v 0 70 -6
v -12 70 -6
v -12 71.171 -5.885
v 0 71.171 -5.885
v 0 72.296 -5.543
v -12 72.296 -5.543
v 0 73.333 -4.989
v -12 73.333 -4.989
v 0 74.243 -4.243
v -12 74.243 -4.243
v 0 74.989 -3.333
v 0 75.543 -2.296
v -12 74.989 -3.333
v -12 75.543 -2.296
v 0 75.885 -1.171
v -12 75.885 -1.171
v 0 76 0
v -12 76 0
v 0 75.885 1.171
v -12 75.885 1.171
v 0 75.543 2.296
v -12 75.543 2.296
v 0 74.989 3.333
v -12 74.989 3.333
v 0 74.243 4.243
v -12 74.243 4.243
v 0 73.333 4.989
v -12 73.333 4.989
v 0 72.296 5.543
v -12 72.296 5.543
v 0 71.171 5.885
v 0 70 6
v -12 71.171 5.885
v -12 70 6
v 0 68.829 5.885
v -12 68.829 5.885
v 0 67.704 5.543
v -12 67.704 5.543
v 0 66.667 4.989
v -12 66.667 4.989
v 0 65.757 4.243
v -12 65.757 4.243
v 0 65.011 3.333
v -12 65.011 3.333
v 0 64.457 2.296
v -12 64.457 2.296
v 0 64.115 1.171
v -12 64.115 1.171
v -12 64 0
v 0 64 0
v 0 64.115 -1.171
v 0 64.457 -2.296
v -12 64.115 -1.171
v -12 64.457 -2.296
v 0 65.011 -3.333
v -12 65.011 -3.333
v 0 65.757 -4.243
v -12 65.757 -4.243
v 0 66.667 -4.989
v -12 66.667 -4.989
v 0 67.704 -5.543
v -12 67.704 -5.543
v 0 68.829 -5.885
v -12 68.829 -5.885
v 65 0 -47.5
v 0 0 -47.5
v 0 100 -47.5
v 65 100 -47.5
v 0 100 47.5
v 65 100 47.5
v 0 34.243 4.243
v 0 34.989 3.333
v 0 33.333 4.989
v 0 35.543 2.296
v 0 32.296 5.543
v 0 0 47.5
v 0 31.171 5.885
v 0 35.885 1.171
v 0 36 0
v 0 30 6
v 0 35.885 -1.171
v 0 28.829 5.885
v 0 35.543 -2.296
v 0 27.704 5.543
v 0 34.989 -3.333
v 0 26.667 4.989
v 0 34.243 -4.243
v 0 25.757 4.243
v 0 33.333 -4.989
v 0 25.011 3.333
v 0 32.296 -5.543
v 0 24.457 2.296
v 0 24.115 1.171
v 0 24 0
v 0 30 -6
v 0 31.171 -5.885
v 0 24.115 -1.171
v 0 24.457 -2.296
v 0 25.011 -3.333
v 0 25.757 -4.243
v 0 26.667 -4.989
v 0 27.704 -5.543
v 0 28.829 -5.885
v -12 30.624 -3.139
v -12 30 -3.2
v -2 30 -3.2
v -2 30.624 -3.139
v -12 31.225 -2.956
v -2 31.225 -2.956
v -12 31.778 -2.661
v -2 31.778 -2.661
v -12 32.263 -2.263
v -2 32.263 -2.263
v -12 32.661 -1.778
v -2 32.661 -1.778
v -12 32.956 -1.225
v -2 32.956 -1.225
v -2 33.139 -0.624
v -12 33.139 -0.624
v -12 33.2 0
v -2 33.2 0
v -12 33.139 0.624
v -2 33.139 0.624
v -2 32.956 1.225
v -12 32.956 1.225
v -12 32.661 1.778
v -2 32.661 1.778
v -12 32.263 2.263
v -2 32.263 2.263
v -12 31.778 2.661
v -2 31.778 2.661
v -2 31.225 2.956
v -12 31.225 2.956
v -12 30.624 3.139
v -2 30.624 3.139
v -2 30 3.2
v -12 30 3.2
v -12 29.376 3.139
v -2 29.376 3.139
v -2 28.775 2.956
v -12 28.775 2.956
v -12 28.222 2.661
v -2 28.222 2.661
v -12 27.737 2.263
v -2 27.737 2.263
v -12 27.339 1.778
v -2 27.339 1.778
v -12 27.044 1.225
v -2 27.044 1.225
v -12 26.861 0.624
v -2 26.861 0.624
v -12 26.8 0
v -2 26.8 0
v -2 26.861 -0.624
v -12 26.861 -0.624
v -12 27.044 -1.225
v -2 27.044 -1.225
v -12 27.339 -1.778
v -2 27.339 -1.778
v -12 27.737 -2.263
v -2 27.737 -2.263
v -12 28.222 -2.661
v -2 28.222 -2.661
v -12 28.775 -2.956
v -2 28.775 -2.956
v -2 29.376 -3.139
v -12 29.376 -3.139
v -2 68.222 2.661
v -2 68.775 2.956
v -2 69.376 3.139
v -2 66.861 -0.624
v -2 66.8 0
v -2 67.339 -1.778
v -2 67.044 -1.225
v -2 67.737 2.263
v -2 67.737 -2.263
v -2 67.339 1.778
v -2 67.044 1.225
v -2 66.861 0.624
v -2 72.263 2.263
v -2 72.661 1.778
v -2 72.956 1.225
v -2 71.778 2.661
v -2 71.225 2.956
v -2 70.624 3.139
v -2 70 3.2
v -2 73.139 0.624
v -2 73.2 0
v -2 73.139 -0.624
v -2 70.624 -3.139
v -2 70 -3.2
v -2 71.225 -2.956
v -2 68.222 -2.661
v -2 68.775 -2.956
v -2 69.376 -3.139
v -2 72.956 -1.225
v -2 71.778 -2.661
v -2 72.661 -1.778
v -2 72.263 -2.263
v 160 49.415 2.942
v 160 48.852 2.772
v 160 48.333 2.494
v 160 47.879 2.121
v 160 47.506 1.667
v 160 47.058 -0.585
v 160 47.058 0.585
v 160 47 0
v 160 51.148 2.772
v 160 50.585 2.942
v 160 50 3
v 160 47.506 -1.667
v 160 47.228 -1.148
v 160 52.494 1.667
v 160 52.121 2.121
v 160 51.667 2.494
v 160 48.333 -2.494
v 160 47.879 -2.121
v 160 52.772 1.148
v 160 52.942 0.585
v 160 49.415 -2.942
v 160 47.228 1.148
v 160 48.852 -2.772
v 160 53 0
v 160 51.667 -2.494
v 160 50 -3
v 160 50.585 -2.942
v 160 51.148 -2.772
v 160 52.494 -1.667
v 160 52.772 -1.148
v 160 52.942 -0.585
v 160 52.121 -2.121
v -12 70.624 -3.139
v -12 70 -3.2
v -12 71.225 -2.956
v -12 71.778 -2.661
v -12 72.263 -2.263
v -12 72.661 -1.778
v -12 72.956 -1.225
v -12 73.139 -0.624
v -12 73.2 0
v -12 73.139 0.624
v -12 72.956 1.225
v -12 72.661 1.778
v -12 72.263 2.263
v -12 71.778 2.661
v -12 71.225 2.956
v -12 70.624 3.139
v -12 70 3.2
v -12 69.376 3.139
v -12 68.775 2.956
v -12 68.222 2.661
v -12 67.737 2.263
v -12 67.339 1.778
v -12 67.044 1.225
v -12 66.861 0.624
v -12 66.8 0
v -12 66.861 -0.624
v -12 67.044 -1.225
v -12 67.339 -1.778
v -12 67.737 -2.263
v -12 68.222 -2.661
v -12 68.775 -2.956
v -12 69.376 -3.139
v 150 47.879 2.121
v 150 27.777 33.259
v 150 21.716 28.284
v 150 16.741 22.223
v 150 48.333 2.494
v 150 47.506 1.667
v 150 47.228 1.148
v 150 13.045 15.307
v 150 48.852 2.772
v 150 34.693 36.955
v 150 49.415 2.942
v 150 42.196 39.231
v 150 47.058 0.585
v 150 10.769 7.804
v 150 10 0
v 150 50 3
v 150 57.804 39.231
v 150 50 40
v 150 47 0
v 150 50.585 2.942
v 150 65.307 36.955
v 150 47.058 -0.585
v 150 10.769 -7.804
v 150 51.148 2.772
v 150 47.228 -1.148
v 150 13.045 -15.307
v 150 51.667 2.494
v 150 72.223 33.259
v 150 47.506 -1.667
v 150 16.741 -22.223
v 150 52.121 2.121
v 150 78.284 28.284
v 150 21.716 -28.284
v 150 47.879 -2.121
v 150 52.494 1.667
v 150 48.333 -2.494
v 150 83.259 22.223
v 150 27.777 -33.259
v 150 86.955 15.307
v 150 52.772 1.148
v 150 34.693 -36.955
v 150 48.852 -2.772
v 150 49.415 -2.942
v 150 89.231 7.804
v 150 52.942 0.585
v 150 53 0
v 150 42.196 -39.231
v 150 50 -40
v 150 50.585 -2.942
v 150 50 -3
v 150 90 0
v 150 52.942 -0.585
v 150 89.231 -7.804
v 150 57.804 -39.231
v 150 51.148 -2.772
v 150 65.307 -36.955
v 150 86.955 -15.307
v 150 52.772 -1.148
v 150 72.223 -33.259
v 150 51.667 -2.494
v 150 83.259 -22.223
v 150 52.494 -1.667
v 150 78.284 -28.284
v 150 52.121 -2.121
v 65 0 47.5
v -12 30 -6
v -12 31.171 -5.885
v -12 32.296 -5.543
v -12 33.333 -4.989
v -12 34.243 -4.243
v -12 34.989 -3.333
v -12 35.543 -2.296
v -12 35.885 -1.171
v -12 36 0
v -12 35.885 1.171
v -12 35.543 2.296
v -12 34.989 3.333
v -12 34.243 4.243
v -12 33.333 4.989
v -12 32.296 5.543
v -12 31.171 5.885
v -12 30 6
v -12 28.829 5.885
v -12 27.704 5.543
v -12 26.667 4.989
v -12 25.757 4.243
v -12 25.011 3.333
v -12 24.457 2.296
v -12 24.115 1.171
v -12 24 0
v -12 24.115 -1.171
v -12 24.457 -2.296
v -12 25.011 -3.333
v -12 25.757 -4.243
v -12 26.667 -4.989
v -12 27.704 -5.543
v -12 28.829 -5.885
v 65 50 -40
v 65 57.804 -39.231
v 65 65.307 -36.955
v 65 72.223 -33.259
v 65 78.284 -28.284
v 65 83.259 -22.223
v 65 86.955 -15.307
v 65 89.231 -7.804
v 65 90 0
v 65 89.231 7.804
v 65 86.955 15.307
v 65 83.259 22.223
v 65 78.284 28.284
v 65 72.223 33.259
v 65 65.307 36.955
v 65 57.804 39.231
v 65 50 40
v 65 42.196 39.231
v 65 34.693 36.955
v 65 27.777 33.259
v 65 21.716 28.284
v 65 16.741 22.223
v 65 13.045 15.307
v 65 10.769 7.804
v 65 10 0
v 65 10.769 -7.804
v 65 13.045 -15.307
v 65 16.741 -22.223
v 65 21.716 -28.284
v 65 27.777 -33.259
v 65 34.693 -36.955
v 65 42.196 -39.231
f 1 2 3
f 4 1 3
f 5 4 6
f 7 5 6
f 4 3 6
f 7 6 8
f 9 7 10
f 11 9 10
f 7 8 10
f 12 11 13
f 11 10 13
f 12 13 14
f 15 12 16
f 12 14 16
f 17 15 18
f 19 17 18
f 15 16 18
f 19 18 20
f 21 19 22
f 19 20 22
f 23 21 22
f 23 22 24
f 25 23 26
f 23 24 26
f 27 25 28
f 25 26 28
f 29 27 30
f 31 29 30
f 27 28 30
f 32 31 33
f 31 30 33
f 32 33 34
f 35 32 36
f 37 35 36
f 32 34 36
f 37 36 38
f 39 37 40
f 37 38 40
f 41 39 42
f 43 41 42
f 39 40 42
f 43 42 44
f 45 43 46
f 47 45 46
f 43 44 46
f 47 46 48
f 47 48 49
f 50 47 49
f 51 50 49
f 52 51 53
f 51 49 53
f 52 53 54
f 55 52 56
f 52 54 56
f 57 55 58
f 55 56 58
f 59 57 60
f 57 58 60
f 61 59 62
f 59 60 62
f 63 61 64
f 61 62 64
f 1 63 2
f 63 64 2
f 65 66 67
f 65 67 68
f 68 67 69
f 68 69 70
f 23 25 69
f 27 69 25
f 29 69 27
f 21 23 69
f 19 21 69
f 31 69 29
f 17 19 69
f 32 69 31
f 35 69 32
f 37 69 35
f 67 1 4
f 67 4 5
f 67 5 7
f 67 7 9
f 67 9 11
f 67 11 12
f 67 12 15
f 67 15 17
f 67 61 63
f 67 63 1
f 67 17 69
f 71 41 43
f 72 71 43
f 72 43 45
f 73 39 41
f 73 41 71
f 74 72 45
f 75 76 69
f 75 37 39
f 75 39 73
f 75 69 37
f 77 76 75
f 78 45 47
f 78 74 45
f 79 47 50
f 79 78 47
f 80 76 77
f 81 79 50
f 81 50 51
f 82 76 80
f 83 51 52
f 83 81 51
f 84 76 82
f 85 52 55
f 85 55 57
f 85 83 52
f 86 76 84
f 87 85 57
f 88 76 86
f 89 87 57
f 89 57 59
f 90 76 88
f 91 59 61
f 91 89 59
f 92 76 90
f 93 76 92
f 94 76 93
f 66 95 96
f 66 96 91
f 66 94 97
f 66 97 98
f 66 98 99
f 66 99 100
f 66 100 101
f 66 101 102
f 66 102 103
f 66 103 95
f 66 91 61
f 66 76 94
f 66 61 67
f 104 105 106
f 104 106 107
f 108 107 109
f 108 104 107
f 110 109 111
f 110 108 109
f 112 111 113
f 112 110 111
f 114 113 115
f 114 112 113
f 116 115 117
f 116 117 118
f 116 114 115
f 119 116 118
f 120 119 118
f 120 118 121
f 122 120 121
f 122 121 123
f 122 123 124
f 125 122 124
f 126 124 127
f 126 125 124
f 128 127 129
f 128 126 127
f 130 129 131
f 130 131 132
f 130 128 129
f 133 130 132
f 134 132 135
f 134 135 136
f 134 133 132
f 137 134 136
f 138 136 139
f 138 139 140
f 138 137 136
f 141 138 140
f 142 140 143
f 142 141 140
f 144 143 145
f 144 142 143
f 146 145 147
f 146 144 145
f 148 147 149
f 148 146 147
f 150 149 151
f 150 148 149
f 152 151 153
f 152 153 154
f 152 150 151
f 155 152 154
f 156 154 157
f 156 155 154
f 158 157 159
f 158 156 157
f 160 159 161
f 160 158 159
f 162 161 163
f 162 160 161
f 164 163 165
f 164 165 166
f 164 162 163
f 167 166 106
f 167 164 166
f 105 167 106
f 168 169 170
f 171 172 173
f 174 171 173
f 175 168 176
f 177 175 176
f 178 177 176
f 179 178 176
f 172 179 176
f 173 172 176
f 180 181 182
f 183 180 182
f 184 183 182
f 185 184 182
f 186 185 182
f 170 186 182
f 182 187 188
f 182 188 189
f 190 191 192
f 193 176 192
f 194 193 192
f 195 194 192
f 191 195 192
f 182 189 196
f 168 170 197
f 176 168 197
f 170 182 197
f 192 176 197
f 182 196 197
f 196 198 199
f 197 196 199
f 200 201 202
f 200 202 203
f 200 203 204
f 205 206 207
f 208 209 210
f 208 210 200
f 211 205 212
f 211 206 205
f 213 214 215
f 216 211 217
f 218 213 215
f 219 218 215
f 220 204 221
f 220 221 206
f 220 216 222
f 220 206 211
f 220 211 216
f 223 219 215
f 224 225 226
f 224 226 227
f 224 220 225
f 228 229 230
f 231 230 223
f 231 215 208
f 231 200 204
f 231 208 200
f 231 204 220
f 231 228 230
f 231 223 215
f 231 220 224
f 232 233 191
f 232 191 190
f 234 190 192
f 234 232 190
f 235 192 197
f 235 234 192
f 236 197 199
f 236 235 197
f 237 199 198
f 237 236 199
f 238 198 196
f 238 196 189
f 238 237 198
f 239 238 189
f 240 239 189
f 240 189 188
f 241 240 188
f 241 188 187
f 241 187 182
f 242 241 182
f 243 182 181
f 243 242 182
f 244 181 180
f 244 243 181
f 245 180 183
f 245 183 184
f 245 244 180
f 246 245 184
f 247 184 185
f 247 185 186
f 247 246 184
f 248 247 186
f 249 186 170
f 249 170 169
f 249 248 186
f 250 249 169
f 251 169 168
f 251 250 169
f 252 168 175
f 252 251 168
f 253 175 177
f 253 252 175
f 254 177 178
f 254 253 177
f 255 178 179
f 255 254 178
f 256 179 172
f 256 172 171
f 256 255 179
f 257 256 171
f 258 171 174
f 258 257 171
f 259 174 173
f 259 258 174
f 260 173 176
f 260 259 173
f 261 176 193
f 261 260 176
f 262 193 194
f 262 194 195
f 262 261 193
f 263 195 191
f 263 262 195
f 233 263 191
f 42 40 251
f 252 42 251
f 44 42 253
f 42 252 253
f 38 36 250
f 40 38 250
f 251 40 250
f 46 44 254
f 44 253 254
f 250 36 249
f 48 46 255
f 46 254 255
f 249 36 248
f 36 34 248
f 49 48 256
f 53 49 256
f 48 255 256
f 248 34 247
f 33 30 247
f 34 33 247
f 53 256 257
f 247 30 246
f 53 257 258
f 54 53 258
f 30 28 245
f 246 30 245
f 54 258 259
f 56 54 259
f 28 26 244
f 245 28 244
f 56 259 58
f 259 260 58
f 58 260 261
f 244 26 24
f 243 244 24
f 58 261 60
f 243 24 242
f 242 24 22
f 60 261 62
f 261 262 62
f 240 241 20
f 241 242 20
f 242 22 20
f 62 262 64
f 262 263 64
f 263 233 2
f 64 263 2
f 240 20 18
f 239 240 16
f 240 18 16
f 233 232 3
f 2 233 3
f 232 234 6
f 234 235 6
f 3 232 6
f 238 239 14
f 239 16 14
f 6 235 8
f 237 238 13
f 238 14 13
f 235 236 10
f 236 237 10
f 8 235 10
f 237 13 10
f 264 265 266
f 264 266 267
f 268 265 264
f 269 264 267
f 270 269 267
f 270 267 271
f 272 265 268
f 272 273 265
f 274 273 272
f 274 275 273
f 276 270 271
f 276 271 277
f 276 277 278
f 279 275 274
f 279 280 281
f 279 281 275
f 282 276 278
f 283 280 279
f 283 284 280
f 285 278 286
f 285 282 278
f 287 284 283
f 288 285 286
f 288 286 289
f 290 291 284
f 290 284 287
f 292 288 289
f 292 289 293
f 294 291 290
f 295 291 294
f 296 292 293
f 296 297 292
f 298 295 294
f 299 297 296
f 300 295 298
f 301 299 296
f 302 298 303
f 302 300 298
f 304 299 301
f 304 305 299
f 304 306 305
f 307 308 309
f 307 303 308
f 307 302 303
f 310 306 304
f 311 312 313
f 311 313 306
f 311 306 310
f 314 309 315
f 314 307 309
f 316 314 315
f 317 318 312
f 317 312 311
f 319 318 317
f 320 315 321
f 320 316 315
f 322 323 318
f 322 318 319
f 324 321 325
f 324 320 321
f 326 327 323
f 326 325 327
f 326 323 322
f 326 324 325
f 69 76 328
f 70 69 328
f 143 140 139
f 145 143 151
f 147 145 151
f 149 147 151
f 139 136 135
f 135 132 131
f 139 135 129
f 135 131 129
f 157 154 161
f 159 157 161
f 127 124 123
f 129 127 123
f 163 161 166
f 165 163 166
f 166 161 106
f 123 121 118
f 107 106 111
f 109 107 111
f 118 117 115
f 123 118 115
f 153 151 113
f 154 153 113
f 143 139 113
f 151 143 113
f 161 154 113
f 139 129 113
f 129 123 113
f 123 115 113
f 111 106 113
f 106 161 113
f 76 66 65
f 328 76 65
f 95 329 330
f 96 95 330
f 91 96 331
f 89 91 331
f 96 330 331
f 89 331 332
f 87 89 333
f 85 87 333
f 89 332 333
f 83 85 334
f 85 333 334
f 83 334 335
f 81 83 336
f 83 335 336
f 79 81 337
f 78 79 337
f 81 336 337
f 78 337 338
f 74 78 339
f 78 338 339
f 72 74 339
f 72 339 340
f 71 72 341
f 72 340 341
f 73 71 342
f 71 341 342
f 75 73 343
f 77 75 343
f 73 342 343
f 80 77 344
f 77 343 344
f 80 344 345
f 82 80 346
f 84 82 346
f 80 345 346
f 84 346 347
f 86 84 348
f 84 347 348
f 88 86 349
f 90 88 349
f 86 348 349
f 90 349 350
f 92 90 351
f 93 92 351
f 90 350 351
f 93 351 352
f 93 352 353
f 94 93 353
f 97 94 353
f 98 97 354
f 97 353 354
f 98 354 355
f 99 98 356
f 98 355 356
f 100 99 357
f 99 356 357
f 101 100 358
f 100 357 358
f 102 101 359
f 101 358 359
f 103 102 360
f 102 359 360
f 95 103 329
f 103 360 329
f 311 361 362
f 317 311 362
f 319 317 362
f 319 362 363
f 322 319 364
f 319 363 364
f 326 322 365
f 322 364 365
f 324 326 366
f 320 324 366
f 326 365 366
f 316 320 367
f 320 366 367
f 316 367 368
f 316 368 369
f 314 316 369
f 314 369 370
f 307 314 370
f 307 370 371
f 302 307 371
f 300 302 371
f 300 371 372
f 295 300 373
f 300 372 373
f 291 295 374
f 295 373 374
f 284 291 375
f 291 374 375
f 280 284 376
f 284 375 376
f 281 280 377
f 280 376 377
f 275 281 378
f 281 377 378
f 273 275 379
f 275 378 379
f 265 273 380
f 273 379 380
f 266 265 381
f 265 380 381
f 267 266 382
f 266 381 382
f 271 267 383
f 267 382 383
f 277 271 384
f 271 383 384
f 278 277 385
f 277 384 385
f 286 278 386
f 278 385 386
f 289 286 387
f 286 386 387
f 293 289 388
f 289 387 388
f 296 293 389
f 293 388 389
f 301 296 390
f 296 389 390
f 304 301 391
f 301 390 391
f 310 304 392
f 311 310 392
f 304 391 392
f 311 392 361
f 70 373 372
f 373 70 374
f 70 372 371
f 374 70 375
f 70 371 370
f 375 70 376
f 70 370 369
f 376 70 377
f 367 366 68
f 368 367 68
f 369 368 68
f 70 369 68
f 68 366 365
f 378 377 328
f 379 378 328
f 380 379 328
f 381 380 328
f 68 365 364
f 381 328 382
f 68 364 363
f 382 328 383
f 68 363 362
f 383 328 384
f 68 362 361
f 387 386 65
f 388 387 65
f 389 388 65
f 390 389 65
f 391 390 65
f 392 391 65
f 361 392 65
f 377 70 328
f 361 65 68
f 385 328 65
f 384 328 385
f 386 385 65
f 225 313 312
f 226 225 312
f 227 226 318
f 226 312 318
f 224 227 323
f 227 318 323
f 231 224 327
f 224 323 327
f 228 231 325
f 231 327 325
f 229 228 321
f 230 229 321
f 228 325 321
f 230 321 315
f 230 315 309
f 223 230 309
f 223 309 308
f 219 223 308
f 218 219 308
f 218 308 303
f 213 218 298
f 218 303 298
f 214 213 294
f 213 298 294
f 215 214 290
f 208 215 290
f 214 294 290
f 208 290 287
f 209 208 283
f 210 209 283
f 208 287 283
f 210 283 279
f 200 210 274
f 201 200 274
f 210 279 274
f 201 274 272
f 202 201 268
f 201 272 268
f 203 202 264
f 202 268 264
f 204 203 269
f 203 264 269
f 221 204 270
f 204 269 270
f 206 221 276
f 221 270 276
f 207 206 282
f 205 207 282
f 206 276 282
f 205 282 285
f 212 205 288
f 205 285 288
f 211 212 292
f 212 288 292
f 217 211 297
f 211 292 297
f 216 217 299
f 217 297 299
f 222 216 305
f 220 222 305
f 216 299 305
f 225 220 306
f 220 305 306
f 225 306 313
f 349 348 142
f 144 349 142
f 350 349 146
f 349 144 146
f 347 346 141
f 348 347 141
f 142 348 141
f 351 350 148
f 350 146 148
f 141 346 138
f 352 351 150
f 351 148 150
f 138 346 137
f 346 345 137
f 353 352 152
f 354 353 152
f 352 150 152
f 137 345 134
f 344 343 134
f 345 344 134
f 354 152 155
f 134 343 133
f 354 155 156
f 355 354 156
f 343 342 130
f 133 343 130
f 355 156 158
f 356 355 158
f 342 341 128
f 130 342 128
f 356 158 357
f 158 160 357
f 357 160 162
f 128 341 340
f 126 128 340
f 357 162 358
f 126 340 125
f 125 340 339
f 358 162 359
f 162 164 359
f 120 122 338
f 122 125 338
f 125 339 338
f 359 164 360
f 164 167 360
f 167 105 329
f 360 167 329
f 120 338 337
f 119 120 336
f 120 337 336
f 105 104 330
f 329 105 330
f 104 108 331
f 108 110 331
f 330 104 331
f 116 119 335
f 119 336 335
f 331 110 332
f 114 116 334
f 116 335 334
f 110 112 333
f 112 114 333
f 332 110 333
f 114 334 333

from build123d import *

# Parameters (mm, degrees)
SKETCH1_W           = 65
SKETCH1_H           = 95
PUMP_HEAD_DEPTH     = 100
MOTOR_START         = 65
SKETCH2_R           = 40
MOTOR_DEPTH         = 85
INLET_PORT_START    = -12
SKETCH3_R           = 6
INLET_PORT_DEPTH    = 12
INLET_SOCKET_START  = -12
SKETCH4_R           = 3.2
INLET_SOCKET_DEPTH  = 10
OUTLET_PORT_START   = -12
SKETCH5_R           = 6
OUTLET_PORT_DEPTH   = 12
OUTLET_SOCKET_START = -12
SKETCH6_R           = 3.2
OUTLET_SOCKET_DEPTH = 10
CABLE_STUB_START    = 150
SKETCH7_R           = 3
CABLE_STUB_DEPTH    = 10


with BuildPart() as part:
    # Sketch1 → Pump_Head (new body)
    with BuildSketch(Plane(origin=(0, 0, 0), x_dir=(1, 0, 0), z_dir=(0, 1, 0))):
        with Locations((32.5, 0)):
            Rectangle(SKETCH1_W, SKETCH1_H)
    extrude(amount=PUMP_HEAD_DEPTH)

    # Sketch2 → Motor (add)
    with BuildSketch(Plane(origin=(0, 0, 0), x_dir=(0, 0, -1), z_dir=(1, 0, 0)).offset(MOTOR_START)):
        with Locations((0, 50)):
            Circle(SKETCH2_R)
    extrude(amount=MOTOR_DEPTH)

    # Sketch3 → Inlet_Port (add)
    with BuildSketch(Plane(origin=(0, 0, 0), x_dir=(0, 0, -1), z_dir=(1, 0, 0)).offset(INLET_PORT_START)):
        with Locations((0, 30)):
            Circle(SKETCH3_R)
    extrude(amount=INLET_PORT_DEPTH)

    # Sketch4 → Inlet_Socket (cut)
    with BuildSketch(Plane(origin=(0, 0, 0), x_dir=(0, 0, -1), z_dir=(1, 0, 0)).offset(INLET_SOCKET_START)):
        with Locations((0, 30)):
            Circle(SKETCH4_R)
    extrude(amount=INLET_SOCKET_DEPTH, mode=Mode.SUBTRACT)

    # Sketch5 → Outlet_Port (add)
    with BuildSketch(Plane(origin=(0, 0, 0), x_dir=(0, 0, -1), z_dir=(1, 0, 0)).offset(OUTLET_PORT_START)):
        with Locations((0, 70)):
            Circle(SKETCH5_R)
    extrude(amount=OUTLET_PORT_DEPTH)

    # Sketch6 → Outlet_Socket (cut)
    with BuildSketch(Plane(origin=(0, 0, 0), x_dir=(0, 0, -1), z_dir=(1, 0, 0)).offset(OUTLET_SOCKET_START)):
        with Locations((0, 70)):
            Circle(SKETCH6_R)
    extrude(amount=OUTLET_SOCKET_DEPTH, mode=Mode.SUBTRACT)

    # Sketch7 → Cable_Stub (add)
    with BuildSketch(Plane(origin=(0, 0, 0), x_dir=(0, 0, -1), z_dir=(1, 0, 0)).offset(CABLE_STUB_START)):
        with Locations((0, 50)):
            Circle(SKETCH7_R)
    extrude(amount=CABLE_STUB_DEPTH)


solid = part.part
